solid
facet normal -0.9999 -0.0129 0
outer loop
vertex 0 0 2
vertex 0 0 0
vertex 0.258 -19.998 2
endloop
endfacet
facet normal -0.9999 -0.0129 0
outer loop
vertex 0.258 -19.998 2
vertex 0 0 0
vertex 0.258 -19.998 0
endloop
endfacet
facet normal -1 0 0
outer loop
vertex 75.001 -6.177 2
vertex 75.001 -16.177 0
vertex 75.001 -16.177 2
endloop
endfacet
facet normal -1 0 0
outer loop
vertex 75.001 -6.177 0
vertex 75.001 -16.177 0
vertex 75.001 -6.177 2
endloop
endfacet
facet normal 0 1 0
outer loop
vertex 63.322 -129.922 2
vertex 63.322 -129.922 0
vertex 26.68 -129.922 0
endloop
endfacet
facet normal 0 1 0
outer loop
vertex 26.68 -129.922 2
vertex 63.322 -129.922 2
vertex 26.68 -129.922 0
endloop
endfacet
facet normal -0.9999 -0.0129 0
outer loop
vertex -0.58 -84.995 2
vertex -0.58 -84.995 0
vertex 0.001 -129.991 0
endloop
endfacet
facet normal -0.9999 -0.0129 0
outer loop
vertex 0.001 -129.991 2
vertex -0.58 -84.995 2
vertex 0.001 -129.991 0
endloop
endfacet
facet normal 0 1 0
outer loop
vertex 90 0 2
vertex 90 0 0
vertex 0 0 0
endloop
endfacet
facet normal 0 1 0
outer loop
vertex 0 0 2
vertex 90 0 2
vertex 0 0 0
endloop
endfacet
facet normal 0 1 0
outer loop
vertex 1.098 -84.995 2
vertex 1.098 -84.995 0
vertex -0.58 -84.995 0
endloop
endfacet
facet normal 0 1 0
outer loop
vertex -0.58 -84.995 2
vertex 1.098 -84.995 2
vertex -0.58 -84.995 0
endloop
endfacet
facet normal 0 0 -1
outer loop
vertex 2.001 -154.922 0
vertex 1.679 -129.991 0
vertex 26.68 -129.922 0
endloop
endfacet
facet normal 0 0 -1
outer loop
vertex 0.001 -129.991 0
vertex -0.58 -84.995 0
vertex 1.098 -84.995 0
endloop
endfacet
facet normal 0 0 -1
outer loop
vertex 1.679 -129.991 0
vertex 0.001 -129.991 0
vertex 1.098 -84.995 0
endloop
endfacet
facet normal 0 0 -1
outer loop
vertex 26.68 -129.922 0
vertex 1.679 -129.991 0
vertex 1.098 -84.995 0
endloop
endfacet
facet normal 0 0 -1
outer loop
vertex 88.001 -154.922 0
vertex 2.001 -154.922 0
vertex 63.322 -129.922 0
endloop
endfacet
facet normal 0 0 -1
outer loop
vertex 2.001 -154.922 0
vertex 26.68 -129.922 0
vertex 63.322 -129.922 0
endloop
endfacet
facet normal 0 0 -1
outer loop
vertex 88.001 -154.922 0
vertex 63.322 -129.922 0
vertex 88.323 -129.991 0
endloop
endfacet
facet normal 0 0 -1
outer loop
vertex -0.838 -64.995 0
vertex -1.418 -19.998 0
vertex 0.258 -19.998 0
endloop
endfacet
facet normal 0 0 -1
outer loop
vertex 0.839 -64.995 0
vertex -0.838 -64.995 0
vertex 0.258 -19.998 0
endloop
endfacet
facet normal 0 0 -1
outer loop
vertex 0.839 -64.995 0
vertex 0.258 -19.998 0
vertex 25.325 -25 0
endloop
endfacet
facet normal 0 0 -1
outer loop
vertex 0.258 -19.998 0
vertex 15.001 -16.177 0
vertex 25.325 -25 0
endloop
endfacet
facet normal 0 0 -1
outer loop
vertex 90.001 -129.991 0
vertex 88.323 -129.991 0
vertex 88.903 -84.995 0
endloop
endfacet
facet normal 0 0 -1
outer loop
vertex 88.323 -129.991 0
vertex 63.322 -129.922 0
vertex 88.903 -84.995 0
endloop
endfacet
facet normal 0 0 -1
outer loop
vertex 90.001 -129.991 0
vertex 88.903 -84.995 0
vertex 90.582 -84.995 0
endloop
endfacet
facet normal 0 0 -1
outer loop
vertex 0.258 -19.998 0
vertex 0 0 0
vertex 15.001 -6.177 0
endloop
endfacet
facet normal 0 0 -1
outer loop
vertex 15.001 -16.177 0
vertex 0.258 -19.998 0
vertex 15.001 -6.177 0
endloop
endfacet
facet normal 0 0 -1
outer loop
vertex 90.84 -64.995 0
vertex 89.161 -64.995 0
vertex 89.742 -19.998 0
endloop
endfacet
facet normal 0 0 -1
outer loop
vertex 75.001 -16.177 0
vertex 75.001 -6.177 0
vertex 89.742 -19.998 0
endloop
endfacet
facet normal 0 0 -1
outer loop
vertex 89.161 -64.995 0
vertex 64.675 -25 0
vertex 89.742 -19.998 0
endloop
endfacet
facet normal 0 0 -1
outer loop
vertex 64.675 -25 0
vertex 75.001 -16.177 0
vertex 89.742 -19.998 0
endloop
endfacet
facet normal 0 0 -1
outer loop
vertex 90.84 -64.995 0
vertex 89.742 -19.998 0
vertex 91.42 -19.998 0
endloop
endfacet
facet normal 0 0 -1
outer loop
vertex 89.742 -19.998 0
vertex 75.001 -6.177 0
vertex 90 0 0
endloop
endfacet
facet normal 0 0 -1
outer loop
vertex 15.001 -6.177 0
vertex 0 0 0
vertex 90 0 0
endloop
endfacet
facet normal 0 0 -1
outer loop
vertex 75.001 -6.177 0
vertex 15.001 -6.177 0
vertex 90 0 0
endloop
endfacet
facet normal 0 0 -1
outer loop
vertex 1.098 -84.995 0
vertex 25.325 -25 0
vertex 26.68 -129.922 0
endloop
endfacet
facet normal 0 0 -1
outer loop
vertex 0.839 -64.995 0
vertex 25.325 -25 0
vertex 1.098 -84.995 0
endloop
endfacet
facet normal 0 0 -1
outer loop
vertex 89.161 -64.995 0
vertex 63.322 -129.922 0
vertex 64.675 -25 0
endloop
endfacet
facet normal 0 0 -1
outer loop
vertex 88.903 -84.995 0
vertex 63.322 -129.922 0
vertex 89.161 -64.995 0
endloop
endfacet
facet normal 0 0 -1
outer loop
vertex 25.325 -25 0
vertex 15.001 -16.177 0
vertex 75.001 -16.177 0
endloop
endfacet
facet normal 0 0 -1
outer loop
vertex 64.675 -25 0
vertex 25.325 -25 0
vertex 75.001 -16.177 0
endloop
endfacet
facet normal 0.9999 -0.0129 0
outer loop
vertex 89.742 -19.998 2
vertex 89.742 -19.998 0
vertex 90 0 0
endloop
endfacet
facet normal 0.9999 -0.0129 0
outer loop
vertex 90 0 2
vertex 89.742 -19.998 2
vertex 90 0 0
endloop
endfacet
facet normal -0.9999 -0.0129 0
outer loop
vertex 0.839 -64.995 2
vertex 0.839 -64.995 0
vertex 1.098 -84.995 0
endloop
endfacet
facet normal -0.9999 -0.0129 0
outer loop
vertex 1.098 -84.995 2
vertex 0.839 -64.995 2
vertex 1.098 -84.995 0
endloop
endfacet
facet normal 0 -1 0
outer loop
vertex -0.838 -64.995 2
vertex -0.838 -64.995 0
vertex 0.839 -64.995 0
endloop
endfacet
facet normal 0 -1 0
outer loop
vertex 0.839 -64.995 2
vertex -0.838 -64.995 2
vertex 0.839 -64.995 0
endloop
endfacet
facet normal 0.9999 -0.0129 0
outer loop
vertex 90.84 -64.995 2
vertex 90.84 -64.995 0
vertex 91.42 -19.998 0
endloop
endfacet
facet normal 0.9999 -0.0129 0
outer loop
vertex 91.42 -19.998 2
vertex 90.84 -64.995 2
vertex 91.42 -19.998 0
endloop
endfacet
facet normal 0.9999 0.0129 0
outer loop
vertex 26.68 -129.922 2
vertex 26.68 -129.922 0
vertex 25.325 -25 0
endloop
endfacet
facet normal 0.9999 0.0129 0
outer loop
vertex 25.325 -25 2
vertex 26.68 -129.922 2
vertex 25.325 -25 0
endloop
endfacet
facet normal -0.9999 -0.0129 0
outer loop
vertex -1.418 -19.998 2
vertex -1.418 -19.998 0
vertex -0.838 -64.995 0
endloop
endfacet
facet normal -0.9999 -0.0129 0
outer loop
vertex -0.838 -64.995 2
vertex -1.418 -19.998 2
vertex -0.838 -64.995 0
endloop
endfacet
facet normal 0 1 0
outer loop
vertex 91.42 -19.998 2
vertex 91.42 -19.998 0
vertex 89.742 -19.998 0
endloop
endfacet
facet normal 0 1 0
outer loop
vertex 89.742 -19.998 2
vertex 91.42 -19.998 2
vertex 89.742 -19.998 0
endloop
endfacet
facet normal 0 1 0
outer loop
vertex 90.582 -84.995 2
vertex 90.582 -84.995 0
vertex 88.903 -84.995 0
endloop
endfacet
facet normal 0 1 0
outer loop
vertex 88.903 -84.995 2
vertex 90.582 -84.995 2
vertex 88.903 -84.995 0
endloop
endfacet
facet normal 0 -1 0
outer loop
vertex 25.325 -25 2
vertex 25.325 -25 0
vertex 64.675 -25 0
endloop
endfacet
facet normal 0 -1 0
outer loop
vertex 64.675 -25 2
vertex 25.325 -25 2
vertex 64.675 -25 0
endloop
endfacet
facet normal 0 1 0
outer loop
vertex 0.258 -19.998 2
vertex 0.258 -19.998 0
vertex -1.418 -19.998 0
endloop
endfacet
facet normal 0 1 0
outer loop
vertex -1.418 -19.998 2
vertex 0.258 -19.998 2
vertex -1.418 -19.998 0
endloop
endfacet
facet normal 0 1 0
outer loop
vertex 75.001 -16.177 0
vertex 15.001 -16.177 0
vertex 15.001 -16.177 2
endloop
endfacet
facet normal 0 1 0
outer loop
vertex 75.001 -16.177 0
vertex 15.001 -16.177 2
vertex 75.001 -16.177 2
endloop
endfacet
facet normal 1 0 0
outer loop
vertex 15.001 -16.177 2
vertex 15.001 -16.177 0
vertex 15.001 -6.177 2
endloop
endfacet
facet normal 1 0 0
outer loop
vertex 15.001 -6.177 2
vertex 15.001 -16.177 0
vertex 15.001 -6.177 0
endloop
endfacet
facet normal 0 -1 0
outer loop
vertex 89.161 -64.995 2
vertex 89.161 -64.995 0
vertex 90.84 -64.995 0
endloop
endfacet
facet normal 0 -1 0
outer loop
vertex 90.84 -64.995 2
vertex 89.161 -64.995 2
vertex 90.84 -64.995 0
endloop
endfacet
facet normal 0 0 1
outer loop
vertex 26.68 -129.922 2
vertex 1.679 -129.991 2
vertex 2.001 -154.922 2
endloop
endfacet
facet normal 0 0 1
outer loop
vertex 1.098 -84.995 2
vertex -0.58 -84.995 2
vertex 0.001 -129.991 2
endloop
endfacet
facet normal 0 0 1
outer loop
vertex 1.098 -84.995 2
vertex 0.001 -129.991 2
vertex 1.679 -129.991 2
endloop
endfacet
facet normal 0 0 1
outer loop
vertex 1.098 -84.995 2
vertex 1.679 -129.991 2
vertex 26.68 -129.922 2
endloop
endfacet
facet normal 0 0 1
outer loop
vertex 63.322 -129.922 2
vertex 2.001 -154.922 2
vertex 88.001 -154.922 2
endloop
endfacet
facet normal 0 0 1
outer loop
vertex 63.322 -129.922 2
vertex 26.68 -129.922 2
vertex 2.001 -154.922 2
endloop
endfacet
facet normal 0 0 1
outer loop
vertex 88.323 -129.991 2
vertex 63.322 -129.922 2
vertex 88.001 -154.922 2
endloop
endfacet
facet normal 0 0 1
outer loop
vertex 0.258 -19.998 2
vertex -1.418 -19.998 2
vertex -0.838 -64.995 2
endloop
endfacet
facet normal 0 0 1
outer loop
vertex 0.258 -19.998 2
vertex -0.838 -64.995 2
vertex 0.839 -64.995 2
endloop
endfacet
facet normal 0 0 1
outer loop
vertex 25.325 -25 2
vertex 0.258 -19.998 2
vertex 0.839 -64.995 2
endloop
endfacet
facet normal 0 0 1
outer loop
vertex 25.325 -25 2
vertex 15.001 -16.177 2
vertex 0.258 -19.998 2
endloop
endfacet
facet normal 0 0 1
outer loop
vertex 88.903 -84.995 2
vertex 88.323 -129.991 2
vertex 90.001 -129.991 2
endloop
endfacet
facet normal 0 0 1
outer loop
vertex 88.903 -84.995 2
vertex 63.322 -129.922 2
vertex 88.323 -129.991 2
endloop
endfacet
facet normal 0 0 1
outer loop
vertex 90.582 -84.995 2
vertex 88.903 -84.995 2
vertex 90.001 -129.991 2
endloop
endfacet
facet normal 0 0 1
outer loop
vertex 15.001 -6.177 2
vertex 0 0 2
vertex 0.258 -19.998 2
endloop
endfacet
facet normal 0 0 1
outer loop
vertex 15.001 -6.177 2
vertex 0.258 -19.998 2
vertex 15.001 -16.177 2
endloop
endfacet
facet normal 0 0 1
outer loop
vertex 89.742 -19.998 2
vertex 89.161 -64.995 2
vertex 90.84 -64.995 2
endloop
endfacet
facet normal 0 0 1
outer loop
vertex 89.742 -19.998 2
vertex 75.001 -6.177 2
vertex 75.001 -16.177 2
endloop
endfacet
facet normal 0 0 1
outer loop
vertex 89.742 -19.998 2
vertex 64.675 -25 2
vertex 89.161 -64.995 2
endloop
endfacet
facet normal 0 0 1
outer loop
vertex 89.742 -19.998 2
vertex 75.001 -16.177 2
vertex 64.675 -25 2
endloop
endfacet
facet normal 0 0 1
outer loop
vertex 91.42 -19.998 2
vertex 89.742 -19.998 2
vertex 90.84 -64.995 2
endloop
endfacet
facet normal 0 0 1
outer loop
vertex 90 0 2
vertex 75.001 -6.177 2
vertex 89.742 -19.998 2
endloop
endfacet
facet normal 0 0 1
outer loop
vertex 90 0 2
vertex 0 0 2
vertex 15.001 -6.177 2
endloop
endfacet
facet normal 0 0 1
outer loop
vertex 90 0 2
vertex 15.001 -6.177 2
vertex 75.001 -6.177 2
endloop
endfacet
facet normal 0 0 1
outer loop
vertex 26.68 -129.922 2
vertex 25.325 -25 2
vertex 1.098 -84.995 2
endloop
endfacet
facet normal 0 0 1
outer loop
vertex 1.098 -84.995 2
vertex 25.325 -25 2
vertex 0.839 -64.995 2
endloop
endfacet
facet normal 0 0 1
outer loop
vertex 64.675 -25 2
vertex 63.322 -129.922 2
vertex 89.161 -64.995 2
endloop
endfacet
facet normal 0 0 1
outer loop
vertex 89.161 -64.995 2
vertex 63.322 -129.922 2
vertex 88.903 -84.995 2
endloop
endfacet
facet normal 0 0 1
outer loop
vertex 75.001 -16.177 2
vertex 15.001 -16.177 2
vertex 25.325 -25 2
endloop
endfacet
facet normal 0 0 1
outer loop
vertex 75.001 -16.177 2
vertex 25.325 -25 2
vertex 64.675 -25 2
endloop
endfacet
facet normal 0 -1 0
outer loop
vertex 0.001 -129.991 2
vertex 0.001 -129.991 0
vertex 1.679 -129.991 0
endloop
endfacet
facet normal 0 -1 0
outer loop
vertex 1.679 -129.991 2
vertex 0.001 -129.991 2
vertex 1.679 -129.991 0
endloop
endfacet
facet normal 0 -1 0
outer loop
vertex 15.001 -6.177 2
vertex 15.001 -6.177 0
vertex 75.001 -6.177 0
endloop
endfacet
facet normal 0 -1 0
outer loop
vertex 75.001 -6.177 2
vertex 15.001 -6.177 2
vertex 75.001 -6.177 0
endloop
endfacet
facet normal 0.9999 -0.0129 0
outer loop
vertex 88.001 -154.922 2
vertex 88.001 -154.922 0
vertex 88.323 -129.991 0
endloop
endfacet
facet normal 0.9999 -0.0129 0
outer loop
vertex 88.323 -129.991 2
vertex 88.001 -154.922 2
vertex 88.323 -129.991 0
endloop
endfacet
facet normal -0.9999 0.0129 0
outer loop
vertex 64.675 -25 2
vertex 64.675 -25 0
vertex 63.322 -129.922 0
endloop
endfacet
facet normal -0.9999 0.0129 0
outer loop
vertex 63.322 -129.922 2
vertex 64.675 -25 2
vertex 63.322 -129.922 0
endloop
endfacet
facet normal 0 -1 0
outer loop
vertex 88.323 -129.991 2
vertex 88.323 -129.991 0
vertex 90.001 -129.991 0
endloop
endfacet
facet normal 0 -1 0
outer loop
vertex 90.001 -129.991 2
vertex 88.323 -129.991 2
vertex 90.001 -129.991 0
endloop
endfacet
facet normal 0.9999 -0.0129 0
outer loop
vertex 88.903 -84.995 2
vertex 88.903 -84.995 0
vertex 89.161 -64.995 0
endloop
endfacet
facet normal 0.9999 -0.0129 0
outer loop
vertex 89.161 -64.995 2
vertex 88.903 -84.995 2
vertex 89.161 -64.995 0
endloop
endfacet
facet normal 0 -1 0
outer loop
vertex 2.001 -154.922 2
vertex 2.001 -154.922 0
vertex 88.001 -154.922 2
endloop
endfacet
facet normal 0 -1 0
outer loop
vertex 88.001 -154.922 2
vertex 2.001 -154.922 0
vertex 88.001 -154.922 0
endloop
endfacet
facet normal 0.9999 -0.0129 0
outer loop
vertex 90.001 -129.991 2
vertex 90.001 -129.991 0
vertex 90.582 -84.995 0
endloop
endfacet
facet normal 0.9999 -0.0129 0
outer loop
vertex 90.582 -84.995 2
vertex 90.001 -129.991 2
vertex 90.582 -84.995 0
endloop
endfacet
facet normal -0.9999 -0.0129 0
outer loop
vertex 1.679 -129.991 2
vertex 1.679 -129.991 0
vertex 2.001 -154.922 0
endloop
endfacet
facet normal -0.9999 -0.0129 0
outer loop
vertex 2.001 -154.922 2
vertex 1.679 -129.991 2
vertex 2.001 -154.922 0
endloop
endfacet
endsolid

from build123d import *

# Parameters (mm, degrees)
SKETCH1_W           = 60
SKETCH1_H           = 10
BOSS_EXTRUDE1_DEPTH = 2


with BuildPart() as part:
    # Sketch1 → Boss-Extrude1 (new body)
    with BuildSketch(Plane.XY):
        Polygon((90, 0), (0, 0), (0.258301591, -19.998335275), (-1.418256709, -19.998335275), (-0.837659875, -64.994589645), (0.839480171, -64.994589645), (1.097803264, -84.994589645), (-0.579595357, -84.994589645), (0.001001477, -129.990844015), (1.678981844, -129.990844015), (2.001001477, -154.922384552), (88.001001477, -154.922384552), (88.322698776, -129.990844015), (90.001001477, -129.990844015), (90.581598311, -84.994589645), (88.903295611, -84.994589645), (89.161360128, -64.994589645), (90.839662829, -64.994589645), (91.420259663, -19.998335275), (89.741956963, -19.998335275), align=None)
        Polygon((25.324989117, -25), (64.675338274, -25), (63.321501046, -129.922384552), (26.680182862, -129.922384552), align=None, mode=Mode.SUBTRACT)
        with Locations((45.001001477, -11.176996481)):
            Rectangle(SKETCH1_W, SKETCH1_H, mode=Mode.SUBTRACT)
    extrude(amount=BOSS_EXTRUDE1_DEPTH)


solid = part.part
